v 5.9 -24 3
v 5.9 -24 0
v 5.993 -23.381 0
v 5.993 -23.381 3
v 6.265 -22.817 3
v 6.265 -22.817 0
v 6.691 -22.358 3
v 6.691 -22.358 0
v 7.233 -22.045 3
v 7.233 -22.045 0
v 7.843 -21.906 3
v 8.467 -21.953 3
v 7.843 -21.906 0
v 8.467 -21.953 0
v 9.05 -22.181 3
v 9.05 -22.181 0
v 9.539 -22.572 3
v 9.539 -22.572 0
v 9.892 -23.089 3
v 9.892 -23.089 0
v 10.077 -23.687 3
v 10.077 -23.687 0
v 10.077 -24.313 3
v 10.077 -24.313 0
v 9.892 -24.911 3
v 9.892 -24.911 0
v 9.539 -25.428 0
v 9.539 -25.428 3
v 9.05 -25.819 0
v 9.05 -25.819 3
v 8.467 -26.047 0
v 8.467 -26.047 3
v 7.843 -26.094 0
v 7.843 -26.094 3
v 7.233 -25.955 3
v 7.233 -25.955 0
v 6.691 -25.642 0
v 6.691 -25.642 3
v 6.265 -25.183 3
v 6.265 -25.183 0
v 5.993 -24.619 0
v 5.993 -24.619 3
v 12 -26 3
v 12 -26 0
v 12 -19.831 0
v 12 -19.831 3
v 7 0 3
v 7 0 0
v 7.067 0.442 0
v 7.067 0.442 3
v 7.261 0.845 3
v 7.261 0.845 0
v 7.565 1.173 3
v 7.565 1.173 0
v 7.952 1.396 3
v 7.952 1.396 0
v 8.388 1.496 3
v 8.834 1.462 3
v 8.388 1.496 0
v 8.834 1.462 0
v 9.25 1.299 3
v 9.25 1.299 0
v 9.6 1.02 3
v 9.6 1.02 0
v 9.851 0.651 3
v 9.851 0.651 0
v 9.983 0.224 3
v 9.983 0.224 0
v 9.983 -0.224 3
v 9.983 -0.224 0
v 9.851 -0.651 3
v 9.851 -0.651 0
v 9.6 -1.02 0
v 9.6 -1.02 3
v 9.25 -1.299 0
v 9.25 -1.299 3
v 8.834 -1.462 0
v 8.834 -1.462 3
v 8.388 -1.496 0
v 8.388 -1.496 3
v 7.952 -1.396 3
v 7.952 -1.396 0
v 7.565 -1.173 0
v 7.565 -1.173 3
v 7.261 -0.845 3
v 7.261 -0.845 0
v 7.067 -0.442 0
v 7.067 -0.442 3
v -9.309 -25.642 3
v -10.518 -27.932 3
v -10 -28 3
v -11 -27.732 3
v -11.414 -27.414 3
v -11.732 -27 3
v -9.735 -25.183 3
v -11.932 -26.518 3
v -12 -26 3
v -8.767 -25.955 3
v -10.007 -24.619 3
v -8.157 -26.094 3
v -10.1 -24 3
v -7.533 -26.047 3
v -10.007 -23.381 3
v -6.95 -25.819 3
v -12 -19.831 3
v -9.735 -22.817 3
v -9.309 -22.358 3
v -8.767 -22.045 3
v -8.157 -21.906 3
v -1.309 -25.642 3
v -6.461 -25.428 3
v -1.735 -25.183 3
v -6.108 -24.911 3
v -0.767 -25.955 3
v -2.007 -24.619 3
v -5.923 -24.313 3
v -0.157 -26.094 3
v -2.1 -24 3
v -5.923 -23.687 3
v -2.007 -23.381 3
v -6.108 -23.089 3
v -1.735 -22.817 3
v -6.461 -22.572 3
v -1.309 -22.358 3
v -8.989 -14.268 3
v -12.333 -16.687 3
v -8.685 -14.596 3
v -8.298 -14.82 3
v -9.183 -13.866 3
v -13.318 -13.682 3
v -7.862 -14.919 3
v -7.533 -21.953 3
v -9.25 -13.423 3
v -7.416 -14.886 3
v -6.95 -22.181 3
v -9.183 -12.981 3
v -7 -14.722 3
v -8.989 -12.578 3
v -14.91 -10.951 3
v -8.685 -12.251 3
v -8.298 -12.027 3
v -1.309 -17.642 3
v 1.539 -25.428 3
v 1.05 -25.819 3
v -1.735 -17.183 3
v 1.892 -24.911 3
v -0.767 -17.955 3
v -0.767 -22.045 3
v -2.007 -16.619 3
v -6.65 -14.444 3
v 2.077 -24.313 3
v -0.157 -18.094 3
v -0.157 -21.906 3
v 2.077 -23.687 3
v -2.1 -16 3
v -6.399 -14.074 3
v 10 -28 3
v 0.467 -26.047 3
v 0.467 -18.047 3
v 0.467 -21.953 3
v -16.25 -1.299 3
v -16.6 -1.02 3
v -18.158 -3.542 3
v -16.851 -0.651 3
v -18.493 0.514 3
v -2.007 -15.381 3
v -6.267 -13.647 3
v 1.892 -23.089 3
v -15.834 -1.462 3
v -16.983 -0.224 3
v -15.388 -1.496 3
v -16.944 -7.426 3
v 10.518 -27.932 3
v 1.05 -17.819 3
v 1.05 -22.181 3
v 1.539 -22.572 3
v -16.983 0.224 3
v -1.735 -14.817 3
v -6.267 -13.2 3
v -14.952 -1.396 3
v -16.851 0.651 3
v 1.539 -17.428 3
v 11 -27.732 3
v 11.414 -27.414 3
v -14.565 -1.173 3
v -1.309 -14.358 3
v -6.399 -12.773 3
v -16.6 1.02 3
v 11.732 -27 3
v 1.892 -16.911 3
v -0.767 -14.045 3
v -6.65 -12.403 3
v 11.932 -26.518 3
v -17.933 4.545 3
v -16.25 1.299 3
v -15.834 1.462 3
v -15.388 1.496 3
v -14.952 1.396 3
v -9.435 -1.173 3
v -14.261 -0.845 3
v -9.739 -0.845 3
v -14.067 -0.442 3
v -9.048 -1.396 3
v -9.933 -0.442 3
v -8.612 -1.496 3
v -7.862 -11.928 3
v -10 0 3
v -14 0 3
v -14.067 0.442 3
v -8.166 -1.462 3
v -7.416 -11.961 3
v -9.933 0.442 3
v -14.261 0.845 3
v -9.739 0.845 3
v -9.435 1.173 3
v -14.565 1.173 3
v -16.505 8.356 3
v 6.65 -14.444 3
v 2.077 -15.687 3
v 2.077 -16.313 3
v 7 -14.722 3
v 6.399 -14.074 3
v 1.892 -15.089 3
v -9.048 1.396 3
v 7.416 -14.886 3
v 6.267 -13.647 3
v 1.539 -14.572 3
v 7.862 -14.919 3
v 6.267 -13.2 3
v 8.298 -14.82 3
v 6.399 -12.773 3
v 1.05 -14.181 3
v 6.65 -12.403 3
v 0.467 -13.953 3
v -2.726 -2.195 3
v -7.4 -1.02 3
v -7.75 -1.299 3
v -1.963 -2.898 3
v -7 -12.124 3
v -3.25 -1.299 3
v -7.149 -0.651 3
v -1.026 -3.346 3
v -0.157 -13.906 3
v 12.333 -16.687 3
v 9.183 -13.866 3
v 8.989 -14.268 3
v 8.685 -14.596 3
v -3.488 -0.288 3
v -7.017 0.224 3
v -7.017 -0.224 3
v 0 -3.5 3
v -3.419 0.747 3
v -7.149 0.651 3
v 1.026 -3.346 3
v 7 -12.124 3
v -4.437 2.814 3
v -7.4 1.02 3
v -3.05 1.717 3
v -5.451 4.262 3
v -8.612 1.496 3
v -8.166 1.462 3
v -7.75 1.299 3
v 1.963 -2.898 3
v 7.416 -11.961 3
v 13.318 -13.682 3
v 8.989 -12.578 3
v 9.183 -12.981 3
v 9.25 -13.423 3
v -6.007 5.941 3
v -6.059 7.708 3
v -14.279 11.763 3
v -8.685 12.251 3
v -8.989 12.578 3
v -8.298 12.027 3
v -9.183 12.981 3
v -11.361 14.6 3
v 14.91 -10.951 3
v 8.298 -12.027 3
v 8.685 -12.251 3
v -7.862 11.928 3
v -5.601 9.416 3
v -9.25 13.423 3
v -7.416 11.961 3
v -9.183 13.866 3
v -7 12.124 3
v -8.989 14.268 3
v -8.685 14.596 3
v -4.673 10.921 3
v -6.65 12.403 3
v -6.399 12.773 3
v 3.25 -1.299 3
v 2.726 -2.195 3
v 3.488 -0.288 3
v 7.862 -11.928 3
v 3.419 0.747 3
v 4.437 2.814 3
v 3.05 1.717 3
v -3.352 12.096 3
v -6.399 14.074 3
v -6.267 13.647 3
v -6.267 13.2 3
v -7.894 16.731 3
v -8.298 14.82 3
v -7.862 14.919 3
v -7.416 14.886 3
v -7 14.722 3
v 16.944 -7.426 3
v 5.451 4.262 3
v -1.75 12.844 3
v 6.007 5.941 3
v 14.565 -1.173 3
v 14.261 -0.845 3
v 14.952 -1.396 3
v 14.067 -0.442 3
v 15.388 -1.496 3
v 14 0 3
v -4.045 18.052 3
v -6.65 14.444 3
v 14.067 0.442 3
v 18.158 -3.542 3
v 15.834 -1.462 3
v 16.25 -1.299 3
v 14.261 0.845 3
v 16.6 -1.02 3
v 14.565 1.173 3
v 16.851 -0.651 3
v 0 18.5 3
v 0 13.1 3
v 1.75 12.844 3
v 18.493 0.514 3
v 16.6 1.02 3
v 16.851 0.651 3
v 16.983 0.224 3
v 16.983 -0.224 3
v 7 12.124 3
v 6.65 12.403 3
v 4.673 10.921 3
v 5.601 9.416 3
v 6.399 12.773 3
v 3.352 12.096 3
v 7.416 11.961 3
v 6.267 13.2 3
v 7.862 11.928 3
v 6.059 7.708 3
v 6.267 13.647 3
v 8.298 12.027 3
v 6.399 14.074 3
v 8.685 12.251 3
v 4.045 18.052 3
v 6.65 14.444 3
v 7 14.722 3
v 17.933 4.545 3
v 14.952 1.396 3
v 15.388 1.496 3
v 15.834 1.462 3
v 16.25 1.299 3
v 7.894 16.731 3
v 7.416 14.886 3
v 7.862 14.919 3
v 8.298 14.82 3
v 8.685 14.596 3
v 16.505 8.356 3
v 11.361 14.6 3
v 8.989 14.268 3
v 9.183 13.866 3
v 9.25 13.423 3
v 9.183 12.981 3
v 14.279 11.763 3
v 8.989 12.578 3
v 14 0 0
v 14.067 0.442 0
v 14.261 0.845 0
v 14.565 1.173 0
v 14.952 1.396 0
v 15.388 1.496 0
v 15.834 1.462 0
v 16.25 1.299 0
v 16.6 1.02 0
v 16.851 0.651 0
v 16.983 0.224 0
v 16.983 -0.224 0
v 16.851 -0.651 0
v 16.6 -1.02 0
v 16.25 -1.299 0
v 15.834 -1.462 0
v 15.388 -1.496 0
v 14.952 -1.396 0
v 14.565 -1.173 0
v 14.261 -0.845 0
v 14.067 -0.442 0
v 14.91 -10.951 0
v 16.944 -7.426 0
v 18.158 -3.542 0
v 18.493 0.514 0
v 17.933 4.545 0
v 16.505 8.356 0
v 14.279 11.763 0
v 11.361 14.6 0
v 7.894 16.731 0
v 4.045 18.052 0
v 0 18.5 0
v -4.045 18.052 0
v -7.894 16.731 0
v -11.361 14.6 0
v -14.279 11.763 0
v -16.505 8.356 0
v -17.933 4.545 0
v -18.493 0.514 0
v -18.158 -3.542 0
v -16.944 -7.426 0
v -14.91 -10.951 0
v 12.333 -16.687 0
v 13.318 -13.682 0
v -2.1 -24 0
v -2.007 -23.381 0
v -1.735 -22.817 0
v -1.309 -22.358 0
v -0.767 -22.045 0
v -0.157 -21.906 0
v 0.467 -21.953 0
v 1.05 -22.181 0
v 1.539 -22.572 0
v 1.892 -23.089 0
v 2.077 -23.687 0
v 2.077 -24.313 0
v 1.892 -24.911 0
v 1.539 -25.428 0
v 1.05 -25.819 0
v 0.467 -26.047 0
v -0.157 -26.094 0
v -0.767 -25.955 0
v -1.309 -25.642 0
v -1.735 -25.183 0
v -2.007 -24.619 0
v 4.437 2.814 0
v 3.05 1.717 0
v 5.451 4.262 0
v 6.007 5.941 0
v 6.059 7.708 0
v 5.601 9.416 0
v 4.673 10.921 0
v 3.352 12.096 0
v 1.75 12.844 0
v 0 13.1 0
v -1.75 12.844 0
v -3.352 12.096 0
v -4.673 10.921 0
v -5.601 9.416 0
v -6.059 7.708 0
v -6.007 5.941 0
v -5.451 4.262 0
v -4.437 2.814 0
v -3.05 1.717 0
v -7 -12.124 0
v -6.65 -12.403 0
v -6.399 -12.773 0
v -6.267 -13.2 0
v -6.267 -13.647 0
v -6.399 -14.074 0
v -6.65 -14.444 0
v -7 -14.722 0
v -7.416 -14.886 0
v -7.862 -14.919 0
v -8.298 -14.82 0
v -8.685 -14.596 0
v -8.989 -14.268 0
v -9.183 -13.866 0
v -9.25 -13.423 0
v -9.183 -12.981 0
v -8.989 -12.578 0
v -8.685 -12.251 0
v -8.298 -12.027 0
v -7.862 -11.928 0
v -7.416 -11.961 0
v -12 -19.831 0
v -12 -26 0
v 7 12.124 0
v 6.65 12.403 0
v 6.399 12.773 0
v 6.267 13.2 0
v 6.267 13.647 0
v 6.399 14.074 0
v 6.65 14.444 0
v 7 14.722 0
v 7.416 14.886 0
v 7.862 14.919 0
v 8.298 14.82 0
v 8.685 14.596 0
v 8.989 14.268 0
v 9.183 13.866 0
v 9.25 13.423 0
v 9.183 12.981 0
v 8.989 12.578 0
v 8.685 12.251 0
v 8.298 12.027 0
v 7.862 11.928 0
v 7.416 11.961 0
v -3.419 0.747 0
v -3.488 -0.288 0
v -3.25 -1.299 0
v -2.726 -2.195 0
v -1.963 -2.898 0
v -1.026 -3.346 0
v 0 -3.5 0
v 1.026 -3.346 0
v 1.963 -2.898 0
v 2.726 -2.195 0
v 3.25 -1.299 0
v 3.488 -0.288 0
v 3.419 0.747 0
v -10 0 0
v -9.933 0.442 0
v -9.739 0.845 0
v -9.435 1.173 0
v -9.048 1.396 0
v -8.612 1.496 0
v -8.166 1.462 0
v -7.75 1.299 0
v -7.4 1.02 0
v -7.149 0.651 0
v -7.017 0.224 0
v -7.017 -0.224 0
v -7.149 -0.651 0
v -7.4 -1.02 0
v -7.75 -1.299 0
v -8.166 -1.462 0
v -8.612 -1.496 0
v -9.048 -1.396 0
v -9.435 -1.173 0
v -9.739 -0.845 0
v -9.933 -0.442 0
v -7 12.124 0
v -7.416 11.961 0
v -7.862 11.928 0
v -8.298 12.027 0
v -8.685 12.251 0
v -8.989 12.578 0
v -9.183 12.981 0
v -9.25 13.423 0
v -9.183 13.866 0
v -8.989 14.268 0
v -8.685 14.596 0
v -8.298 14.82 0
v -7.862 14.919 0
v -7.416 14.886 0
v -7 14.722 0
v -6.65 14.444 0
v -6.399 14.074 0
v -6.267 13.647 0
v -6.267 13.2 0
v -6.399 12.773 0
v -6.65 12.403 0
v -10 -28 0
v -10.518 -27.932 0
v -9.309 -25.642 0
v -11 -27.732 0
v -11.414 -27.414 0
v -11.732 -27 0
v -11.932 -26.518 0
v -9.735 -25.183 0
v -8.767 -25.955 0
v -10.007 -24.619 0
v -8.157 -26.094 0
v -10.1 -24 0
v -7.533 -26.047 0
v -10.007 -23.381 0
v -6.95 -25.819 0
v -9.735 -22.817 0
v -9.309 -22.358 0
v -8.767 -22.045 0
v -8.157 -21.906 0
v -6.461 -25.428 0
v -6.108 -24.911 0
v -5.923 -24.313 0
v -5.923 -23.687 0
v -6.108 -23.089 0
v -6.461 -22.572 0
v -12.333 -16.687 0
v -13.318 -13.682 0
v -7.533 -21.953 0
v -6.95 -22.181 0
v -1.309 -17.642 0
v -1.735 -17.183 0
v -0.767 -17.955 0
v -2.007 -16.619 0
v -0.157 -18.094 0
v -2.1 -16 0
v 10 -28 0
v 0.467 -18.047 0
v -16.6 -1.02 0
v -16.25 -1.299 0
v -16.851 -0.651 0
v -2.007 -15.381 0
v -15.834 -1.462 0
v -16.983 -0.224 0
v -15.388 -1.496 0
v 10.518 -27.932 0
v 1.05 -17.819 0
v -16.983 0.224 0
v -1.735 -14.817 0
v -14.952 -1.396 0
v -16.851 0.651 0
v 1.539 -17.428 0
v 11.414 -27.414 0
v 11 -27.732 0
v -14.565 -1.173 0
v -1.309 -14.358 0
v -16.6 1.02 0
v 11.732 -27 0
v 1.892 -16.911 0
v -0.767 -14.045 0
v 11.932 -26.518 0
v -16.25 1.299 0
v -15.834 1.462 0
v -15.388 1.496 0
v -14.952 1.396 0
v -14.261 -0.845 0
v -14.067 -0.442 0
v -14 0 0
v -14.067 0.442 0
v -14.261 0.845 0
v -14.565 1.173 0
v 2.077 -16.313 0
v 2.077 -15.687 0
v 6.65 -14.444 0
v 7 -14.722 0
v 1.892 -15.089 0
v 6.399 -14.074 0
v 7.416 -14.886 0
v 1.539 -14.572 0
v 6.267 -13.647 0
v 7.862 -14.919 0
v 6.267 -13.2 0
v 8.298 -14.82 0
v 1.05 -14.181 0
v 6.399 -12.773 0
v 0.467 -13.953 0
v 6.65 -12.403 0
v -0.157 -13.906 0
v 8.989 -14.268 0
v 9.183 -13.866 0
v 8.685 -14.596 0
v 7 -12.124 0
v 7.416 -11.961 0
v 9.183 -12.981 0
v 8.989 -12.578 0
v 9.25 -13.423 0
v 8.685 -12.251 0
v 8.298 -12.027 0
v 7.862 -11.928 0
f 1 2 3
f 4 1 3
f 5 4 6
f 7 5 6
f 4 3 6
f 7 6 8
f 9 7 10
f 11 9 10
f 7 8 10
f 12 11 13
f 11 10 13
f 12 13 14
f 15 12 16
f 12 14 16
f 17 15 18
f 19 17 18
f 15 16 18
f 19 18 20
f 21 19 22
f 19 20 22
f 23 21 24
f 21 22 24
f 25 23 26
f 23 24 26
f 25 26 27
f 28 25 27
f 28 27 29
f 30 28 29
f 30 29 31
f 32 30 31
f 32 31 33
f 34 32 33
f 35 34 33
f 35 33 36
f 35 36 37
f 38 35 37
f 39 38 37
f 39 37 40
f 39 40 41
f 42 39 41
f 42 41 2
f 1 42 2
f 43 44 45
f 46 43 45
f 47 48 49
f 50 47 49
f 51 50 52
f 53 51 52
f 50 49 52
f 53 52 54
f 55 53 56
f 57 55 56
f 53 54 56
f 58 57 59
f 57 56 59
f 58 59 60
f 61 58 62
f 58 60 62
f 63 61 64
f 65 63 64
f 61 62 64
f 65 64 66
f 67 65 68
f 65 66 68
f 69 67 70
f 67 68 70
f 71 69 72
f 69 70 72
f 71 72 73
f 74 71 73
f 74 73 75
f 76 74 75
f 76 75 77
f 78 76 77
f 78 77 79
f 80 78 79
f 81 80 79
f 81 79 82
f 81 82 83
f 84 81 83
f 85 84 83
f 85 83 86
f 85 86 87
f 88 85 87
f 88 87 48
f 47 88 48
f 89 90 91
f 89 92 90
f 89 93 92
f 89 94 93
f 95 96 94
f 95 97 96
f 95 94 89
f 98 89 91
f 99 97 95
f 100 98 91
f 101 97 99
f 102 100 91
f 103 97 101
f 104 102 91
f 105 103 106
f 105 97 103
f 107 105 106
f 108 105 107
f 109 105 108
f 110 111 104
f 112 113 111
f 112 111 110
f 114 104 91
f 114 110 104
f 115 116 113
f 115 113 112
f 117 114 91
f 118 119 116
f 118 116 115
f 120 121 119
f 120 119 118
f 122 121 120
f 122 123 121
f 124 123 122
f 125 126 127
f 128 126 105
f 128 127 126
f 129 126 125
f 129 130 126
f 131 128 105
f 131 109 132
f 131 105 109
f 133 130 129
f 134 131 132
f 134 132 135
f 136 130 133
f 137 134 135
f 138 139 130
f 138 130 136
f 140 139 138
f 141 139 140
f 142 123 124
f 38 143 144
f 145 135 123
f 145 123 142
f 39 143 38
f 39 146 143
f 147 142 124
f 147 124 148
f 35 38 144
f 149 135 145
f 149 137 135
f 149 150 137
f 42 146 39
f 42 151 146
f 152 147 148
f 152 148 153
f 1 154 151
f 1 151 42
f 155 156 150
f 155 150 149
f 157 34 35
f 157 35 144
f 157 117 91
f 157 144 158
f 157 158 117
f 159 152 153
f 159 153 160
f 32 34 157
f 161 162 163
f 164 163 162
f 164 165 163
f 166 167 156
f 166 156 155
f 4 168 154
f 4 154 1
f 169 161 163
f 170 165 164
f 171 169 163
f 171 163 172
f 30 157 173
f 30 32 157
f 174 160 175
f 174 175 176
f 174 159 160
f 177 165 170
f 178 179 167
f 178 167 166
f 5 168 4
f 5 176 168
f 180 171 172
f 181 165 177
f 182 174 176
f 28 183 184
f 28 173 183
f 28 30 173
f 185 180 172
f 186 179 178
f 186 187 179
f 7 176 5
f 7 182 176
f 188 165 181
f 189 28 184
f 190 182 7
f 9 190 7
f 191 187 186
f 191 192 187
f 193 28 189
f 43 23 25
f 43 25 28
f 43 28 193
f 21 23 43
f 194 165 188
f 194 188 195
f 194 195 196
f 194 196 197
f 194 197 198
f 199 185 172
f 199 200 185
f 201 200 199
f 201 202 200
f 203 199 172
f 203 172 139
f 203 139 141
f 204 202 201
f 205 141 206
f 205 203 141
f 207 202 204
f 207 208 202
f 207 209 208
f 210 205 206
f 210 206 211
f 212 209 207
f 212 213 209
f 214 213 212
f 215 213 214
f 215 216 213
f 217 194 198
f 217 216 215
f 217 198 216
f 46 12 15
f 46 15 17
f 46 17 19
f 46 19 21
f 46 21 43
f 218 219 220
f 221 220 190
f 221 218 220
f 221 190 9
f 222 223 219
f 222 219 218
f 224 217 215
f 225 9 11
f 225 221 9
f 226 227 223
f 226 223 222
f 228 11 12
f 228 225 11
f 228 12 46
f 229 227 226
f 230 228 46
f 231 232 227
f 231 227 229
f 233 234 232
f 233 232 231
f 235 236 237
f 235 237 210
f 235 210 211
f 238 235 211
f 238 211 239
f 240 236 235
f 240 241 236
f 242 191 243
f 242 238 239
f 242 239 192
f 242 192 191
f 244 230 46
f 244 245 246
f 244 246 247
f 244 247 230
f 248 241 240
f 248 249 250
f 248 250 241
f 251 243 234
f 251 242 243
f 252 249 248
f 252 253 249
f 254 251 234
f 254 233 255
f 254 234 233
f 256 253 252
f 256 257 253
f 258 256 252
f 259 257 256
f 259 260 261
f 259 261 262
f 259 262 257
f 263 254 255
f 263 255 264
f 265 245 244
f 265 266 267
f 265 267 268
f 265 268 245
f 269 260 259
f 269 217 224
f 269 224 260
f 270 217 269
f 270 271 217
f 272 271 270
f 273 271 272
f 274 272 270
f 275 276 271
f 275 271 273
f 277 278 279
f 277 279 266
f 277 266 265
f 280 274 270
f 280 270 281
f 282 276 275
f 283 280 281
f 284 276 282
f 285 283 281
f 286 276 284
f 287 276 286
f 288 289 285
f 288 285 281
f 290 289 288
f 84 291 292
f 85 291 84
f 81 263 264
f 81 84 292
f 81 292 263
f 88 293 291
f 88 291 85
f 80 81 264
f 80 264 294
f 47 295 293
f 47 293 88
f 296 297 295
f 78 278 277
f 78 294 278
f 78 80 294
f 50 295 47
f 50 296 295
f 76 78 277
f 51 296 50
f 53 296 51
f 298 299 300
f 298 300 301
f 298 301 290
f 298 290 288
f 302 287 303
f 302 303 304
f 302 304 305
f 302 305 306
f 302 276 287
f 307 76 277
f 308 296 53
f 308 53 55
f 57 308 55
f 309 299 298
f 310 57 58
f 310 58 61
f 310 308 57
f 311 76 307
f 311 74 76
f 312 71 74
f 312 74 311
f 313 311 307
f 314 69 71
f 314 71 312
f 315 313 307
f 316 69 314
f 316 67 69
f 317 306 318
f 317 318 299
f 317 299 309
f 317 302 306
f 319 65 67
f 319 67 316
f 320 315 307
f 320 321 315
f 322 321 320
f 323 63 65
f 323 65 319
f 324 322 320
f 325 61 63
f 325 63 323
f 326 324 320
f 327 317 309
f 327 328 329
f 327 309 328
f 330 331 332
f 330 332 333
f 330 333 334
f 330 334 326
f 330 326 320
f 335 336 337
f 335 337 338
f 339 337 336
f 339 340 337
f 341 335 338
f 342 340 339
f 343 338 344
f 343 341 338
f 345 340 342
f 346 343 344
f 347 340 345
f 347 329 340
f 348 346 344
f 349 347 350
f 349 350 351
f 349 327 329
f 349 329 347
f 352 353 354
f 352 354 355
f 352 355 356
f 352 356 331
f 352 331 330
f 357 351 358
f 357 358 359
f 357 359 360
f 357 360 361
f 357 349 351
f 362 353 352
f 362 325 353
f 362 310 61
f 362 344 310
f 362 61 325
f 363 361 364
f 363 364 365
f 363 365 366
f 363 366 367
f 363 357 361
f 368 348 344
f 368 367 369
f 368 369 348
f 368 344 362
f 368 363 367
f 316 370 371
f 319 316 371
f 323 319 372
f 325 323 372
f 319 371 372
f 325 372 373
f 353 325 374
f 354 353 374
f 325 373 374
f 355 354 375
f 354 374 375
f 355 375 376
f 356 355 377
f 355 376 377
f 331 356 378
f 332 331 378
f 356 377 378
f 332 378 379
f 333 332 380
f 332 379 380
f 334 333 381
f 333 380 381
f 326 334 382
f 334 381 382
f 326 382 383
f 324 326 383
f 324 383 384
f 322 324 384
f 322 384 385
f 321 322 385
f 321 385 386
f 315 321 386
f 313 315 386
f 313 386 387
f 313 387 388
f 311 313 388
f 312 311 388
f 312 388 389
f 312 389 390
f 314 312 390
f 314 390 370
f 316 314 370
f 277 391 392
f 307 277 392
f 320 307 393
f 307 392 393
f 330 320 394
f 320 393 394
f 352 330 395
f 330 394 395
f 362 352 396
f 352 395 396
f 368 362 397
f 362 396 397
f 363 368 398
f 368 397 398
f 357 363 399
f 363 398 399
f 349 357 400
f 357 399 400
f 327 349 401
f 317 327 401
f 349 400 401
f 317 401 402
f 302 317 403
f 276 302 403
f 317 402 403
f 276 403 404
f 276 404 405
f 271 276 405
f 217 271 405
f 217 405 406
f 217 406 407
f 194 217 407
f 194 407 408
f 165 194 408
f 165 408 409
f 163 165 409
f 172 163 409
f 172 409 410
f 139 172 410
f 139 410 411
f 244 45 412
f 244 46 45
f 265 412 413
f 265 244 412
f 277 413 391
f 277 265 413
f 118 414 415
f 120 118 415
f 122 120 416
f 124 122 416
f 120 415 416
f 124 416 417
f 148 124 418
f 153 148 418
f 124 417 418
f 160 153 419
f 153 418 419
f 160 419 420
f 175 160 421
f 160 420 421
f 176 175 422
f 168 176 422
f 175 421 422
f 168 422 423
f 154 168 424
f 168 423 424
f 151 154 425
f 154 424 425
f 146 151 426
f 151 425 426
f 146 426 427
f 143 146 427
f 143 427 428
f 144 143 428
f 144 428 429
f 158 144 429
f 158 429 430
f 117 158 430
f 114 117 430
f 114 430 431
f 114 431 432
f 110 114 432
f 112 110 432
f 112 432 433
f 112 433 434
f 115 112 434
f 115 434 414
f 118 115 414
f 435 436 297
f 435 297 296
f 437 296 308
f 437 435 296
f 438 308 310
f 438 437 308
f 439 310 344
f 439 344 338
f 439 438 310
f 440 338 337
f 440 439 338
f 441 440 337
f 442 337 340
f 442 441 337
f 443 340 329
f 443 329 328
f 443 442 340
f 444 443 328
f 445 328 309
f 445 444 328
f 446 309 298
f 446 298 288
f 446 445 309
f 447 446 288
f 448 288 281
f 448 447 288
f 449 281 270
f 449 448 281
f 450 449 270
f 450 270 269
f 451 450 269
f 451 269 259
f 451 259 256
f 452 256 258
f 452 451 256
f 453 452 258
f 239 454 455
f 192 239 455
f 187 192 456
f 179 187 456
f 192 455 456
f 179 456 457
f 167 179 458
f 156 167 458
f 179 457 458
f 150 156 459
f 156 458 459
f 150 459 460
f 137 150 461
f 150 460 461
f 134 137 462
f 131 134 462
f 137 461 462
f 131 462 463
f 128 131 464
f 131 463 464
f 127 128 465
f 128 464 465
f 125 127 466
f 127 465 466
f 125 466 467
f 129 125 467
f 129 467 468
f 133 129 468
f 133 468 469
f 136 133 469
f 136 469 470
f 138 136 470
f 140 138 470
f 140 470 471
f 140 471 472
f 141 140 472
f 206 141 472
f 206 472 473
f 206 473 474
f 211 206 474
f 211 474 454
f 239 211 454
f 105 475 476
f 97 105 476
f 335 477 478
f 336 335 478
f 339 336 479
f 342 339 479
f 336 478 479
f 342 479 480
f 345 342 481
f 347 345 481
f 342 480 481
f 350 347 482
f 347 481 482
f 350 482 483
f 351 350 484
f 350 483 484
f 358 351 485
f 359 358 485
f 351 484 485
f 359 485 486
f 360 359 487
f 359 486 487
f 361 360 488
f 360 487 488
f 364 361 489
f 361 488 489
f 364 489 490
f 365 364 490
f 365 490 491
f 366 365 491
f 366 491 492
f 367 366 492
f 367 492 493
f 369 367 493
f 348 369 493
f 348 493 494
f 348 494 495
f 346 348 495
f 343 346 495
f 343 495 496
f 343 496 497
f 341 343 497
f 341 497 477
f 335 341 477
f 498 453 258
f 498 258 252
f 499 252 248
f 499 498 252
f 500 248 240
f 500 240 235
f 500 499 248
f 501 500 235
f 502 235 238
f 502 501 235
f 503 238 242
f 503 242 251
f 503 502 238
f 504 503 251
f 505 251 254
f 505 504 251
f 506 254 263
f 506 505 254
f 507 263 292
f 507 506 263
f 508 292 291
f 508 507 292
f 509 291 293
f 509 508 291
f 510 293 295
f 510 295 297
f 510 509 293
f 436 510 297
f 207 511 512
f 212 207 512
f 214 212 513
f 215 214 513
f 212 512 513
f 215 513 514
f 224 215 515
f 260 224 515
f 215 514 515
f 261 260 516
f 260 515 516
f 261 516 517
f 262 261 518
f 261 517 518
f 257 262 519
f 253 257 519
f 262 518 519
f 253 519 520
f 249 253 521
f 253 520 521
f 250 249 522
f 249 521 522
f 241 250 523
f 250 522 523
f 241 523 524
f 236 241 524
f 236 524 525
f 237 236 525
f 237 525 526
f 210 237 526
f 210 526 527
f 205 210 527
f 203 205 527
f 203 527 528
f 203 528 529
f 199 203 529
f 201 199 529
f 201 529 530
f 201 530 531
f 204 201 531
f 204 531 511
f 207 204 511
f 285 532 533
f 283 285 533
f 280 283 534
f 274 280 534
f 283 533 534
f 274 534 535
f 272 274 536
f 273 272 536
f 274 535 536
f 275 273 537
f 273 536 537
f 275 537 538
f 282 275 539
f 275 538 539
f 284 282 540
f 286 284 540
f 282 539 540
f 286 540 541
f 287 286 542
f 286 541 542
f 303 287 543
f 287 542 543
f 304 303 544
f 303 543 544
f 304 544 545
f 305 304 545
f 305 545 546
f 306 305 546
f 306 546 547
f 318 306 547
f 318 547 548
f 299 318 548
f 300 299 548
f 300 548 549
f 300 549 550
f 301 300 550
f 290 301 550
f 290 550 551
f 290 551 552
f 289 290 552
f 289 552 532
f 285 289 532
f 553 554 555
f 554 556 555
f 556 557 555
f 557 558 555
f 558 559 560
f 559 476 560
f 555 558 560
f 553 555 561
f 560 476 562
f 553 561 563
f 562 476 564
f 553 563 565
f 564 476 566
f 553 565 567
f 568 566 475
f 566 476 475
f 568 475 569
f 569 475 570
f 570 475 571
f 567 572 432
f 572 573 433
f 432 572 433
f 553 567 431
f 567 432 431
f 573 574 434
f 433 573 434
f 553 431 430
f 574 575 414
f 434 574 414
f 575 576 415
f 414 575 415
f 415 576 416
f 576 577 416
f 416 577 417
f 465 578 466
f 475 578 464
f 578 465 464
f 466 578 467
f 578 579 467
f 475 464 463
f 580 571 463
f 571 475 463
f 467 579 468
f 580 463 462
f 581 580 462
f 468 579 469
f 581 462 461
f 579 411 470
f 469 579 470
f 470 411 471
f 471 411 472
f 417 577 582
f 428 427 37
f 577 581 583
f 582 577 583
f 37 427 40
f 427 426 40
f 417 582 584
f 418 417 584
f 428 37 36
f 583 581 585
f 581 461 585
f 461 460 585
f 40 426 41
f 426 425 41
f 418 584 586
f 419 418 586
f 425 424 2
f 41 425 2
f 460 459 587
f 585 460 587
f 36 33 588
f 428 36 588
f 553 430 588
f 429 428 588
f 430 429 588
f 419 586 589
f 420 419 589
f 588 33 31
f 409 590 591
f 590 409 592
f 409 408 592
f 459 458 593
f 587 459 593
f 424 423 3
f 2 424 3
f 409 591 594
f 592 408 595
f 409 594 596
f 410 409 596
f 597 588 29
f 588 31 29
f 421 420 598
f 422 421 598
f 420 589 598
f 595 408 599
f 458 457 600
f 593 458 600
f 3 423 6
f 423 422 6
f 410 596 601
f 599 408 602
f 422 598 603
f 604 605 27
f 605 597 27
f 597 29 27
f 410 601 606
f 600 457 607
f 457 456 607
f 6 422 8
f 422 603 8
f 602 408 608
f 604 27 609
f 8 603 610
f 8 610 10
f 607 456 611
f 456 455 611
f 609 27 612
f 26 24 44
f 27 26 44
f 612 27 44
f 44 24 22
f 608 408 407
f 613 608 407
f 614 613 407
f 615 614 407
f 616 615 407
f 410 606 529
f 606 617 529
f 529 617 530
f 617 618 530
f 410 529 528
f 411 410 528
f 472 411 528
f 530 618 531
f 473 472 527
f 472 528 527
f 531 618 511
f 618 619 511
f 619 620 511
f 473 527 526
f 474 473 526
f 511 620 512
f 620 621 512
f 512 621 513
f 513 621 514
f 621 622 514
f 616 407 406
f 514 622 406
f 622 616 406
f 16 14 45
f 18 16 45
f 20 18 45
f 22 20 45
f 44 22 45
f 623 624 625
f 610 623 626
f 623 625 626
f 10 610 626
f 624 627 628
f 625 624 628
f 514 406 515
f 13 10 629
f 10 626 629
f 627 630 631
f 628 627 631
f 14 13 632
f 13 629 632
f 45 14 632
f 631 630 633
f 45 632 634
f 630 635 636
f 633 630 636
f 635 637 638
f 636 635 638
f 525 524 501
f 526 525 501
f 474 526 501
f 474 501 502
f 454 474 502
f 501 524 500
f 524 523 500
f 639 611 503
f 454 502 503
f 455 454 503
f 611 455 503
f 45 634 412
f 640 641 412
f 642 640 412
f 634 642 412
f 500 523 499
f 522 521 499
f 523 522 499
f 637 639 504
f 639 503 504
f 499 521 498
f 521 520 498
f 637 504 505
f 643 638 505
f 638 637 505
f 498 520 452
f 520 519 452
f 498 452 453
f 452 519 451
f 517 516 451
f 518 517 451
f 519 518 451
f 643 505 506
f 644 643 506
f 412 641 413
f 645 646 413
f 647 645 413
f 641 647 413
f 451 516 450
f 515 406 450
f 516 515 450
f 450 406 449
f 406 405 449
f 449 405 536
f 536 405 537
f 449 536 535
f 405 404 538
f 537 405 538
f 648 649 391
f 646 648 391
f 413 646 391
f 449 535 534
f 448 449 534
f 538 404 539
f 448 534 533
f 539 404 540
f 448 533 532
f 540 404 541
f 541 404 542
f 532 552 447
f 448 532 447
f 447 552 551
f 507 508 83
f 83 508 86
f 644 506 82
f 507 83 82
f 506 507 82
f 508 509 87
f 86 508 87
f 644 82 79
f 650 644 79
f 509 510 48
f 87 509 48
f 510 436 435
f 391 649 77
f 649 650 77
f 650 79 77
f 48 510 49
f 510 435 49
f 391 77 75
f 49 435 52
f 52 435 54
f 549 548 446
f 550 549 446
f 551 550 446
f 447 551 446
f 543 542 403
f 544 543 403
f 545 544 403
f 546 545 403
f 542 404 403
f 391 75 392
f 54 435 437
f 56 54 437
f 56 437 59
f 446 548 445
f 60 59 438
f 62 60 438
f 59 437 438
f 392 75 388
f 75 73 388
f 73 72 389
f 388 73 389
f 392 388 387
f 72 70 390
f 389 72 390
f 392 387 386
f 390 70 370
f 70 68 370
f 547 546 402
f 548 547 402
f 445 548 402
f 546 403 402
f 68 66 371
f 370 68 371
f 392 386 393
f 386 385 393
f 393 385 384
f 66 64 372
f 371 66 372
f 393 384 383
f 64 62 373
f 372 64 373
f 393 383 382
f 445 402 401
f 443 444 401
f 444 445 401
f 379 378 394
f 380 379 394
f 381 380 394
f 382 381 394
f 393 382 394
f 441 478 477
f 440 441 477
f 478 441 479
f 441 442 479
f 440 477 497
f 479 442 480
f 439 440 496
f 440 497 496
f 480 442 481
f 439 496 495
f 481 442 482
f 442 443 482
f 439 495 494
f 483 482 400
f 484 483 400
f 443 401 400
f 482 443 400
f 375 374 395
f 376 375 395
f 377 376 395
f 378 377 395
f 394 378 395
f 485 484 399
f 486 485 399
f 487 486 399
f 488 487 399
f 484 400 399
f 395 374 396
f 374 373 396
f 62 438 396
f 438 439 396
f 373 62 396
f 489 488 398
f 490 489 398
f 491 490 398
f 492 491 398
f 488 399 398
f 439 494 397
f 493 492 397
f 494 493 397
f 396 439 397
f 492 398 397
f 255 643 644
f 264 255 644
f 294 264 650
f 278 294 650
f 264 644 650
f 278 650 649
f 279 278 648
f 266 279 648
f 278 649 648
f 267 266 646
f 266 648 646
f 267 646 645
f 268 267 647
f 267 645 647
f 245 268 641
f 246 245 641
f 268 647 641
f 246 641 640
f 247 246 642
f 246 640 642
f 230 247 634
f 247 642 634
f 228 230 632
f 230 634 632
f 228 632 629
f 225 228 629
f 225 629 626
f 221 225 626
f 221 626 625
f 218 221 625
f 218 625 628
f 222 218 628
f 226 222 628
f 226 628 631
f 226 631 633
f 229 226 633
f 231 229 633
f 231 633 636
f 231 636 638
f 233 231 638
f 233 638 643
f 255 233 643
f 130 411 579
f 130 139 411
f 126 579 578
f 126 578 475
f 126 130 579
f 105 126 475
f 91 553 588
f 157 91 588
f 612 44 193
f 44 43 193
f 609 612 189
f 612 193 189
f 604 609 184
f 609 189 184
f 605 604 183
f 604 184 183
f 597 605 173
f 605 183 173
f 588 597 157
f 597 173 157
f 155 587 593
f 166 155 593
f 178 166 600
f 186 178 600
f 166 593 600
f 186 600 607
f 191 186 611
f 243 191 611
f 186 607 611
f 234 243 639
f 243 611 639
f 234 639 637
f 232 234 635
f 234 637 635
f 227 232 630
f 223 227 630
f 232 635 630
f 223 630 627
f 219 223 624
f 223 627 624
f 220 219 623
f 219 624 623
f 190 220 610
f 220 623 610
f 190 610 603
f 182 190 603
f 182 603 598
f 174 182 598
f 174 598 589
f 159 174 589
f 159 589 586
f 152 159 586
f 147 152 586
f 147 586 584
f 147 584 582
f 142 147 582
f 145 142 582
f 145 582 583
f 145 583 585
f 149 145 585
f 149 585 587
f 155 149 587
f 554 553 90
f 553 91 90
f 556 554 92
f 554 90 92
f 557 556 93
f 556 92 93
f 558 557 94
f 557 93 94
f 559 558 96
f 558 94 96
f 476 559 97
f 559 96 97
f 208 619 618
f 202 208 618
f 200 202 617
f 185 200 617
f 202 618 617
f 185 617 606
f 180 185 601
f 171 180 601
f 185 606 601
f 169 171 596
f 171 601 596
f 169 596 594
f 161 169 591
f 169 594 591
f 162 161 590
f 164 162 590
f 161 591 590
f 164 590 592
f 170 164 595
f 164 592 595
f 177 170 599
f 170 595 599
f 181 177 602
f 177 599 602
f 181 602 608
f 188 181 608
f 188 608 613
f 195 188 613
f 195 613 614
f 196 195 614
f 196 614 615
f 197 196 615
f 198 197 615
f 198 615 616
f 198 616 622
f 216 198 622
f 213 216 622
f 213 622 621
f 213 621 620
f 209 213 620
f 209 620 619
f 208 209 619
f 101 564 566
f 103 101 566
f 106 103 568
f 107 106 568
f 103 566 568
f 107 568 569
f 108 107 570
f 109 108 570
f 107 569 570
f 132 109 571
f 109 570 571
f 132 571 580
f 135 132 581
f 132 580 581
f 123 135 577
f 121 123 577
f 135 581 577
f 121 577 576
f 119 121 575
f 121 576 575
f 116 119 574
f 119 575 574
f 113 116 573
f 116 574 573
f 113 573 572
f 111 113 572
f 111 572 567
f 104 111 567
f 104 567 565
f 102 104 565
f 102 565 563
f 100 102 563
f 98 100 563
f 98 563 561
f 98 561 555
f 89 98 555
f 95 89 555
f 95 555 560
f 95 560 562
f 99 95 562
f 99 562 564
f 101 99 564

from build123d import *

# Parameters (mm, degrees)
BOSS_EXTRUDE1_DEPTH        = 3
F_3_0_3_DIAMETER_HOLE2_D   = 3
CIRPATTERN1_COUNT          = 6
F_4_2_4_2_DIAMETER_HOLE1_D = 4.2
F_3_0_3_DIAMETER_HOLE1_D   = 3
FILLET1_R                  = 15
FILLET2_R                  = 2


with BuildPart() as part:
    # Sketch2 → Boss-Extrude1 (new body)
    with BuildSketch(Plane.XY):
        with BuildLine():
            Line((0, -28), (12, -28))
            Line((12, -28), (12, -14.08012784))
            ThreePointArc((12, -14.08012784), (0, 18.5), (-12, -14.08012784))
            Line((-12, -14.08012784), (-12, -28))
            Line((-12, -28), (0, -28))
        make_face()
        with BuildLine():
            ThreePointArc((-3.049823013, 1.717142857), (0, -3.5), (3.049823013, 1.717142857))
            ThreePointArc((3.049823013, 1.717142857), (0, 13.1), (-3.049823013, 1.717142857))
        make_face(mode=Mode.SUBTRACT)
    extrude(amount=BOSS_EXTRUDE1_DEPTH)

    # Ø3.0 (3) Diameter Hole2 (through all)
    with Locations(Plane.XY.offset(3)):
        with Locations((15.5, 0)):
            f_3_0_3_diameter_hole2 = Hole(F_3_0_3_DIAMETER_HOLE2_D / 2)

    # CirPattern1: Ø3.0 (3) Diameter Hole2 ×6 about axis
    cirpattern1_axis = Axis((0, 0, -0.15), (0, 0, 1))
    for i in range(1, CIRPATTERN1_COUNT):
        add(f_3_0_3_diameter_hole2.rotate(cirpattern1_axis, i * 360 / CIRPATTERN1_COUNT), mode=Mode.SUBTRACT)

    # Ø4.2 (4.2) Diameter Hole1 (through all)
    with Locations(Plane.XY.offset(3)):
        with Locations((0, -16), (0, -24), (8, -24), (-8, -24)):
            Hole(F_4_2_4_2_DIAMETER_HOLE1_D / 2)

    # Ø3.0 (3) Diameter Hole1 (through all)
    with Locations(Plane.XY.offset(3)):
        with Locations((8.5, 0), (-8.5, 0)):
            Hole(F_3_0_3_DIAMETER_HOLE1_D / 2)

    # Fillet1
    fillet1_edges = [part.edges().sort_by_distance(p)[0] for p in [
        (12, -14.08012784, 1.5),
        (-12, -14.08012784, 1.5),
    ]]
    fillet(fillet1_edges, radius=FILLET1_R)

    # Fillet2
    fillet2_edges = [part.edges().sort_by_distance(p)[0] for p in [
        (12, -28, 1.5),
        (-12, -28, 1.5),
    ]]
    fillet(fillet2_edges, radius=FILLET2_R)


solid = part.part
